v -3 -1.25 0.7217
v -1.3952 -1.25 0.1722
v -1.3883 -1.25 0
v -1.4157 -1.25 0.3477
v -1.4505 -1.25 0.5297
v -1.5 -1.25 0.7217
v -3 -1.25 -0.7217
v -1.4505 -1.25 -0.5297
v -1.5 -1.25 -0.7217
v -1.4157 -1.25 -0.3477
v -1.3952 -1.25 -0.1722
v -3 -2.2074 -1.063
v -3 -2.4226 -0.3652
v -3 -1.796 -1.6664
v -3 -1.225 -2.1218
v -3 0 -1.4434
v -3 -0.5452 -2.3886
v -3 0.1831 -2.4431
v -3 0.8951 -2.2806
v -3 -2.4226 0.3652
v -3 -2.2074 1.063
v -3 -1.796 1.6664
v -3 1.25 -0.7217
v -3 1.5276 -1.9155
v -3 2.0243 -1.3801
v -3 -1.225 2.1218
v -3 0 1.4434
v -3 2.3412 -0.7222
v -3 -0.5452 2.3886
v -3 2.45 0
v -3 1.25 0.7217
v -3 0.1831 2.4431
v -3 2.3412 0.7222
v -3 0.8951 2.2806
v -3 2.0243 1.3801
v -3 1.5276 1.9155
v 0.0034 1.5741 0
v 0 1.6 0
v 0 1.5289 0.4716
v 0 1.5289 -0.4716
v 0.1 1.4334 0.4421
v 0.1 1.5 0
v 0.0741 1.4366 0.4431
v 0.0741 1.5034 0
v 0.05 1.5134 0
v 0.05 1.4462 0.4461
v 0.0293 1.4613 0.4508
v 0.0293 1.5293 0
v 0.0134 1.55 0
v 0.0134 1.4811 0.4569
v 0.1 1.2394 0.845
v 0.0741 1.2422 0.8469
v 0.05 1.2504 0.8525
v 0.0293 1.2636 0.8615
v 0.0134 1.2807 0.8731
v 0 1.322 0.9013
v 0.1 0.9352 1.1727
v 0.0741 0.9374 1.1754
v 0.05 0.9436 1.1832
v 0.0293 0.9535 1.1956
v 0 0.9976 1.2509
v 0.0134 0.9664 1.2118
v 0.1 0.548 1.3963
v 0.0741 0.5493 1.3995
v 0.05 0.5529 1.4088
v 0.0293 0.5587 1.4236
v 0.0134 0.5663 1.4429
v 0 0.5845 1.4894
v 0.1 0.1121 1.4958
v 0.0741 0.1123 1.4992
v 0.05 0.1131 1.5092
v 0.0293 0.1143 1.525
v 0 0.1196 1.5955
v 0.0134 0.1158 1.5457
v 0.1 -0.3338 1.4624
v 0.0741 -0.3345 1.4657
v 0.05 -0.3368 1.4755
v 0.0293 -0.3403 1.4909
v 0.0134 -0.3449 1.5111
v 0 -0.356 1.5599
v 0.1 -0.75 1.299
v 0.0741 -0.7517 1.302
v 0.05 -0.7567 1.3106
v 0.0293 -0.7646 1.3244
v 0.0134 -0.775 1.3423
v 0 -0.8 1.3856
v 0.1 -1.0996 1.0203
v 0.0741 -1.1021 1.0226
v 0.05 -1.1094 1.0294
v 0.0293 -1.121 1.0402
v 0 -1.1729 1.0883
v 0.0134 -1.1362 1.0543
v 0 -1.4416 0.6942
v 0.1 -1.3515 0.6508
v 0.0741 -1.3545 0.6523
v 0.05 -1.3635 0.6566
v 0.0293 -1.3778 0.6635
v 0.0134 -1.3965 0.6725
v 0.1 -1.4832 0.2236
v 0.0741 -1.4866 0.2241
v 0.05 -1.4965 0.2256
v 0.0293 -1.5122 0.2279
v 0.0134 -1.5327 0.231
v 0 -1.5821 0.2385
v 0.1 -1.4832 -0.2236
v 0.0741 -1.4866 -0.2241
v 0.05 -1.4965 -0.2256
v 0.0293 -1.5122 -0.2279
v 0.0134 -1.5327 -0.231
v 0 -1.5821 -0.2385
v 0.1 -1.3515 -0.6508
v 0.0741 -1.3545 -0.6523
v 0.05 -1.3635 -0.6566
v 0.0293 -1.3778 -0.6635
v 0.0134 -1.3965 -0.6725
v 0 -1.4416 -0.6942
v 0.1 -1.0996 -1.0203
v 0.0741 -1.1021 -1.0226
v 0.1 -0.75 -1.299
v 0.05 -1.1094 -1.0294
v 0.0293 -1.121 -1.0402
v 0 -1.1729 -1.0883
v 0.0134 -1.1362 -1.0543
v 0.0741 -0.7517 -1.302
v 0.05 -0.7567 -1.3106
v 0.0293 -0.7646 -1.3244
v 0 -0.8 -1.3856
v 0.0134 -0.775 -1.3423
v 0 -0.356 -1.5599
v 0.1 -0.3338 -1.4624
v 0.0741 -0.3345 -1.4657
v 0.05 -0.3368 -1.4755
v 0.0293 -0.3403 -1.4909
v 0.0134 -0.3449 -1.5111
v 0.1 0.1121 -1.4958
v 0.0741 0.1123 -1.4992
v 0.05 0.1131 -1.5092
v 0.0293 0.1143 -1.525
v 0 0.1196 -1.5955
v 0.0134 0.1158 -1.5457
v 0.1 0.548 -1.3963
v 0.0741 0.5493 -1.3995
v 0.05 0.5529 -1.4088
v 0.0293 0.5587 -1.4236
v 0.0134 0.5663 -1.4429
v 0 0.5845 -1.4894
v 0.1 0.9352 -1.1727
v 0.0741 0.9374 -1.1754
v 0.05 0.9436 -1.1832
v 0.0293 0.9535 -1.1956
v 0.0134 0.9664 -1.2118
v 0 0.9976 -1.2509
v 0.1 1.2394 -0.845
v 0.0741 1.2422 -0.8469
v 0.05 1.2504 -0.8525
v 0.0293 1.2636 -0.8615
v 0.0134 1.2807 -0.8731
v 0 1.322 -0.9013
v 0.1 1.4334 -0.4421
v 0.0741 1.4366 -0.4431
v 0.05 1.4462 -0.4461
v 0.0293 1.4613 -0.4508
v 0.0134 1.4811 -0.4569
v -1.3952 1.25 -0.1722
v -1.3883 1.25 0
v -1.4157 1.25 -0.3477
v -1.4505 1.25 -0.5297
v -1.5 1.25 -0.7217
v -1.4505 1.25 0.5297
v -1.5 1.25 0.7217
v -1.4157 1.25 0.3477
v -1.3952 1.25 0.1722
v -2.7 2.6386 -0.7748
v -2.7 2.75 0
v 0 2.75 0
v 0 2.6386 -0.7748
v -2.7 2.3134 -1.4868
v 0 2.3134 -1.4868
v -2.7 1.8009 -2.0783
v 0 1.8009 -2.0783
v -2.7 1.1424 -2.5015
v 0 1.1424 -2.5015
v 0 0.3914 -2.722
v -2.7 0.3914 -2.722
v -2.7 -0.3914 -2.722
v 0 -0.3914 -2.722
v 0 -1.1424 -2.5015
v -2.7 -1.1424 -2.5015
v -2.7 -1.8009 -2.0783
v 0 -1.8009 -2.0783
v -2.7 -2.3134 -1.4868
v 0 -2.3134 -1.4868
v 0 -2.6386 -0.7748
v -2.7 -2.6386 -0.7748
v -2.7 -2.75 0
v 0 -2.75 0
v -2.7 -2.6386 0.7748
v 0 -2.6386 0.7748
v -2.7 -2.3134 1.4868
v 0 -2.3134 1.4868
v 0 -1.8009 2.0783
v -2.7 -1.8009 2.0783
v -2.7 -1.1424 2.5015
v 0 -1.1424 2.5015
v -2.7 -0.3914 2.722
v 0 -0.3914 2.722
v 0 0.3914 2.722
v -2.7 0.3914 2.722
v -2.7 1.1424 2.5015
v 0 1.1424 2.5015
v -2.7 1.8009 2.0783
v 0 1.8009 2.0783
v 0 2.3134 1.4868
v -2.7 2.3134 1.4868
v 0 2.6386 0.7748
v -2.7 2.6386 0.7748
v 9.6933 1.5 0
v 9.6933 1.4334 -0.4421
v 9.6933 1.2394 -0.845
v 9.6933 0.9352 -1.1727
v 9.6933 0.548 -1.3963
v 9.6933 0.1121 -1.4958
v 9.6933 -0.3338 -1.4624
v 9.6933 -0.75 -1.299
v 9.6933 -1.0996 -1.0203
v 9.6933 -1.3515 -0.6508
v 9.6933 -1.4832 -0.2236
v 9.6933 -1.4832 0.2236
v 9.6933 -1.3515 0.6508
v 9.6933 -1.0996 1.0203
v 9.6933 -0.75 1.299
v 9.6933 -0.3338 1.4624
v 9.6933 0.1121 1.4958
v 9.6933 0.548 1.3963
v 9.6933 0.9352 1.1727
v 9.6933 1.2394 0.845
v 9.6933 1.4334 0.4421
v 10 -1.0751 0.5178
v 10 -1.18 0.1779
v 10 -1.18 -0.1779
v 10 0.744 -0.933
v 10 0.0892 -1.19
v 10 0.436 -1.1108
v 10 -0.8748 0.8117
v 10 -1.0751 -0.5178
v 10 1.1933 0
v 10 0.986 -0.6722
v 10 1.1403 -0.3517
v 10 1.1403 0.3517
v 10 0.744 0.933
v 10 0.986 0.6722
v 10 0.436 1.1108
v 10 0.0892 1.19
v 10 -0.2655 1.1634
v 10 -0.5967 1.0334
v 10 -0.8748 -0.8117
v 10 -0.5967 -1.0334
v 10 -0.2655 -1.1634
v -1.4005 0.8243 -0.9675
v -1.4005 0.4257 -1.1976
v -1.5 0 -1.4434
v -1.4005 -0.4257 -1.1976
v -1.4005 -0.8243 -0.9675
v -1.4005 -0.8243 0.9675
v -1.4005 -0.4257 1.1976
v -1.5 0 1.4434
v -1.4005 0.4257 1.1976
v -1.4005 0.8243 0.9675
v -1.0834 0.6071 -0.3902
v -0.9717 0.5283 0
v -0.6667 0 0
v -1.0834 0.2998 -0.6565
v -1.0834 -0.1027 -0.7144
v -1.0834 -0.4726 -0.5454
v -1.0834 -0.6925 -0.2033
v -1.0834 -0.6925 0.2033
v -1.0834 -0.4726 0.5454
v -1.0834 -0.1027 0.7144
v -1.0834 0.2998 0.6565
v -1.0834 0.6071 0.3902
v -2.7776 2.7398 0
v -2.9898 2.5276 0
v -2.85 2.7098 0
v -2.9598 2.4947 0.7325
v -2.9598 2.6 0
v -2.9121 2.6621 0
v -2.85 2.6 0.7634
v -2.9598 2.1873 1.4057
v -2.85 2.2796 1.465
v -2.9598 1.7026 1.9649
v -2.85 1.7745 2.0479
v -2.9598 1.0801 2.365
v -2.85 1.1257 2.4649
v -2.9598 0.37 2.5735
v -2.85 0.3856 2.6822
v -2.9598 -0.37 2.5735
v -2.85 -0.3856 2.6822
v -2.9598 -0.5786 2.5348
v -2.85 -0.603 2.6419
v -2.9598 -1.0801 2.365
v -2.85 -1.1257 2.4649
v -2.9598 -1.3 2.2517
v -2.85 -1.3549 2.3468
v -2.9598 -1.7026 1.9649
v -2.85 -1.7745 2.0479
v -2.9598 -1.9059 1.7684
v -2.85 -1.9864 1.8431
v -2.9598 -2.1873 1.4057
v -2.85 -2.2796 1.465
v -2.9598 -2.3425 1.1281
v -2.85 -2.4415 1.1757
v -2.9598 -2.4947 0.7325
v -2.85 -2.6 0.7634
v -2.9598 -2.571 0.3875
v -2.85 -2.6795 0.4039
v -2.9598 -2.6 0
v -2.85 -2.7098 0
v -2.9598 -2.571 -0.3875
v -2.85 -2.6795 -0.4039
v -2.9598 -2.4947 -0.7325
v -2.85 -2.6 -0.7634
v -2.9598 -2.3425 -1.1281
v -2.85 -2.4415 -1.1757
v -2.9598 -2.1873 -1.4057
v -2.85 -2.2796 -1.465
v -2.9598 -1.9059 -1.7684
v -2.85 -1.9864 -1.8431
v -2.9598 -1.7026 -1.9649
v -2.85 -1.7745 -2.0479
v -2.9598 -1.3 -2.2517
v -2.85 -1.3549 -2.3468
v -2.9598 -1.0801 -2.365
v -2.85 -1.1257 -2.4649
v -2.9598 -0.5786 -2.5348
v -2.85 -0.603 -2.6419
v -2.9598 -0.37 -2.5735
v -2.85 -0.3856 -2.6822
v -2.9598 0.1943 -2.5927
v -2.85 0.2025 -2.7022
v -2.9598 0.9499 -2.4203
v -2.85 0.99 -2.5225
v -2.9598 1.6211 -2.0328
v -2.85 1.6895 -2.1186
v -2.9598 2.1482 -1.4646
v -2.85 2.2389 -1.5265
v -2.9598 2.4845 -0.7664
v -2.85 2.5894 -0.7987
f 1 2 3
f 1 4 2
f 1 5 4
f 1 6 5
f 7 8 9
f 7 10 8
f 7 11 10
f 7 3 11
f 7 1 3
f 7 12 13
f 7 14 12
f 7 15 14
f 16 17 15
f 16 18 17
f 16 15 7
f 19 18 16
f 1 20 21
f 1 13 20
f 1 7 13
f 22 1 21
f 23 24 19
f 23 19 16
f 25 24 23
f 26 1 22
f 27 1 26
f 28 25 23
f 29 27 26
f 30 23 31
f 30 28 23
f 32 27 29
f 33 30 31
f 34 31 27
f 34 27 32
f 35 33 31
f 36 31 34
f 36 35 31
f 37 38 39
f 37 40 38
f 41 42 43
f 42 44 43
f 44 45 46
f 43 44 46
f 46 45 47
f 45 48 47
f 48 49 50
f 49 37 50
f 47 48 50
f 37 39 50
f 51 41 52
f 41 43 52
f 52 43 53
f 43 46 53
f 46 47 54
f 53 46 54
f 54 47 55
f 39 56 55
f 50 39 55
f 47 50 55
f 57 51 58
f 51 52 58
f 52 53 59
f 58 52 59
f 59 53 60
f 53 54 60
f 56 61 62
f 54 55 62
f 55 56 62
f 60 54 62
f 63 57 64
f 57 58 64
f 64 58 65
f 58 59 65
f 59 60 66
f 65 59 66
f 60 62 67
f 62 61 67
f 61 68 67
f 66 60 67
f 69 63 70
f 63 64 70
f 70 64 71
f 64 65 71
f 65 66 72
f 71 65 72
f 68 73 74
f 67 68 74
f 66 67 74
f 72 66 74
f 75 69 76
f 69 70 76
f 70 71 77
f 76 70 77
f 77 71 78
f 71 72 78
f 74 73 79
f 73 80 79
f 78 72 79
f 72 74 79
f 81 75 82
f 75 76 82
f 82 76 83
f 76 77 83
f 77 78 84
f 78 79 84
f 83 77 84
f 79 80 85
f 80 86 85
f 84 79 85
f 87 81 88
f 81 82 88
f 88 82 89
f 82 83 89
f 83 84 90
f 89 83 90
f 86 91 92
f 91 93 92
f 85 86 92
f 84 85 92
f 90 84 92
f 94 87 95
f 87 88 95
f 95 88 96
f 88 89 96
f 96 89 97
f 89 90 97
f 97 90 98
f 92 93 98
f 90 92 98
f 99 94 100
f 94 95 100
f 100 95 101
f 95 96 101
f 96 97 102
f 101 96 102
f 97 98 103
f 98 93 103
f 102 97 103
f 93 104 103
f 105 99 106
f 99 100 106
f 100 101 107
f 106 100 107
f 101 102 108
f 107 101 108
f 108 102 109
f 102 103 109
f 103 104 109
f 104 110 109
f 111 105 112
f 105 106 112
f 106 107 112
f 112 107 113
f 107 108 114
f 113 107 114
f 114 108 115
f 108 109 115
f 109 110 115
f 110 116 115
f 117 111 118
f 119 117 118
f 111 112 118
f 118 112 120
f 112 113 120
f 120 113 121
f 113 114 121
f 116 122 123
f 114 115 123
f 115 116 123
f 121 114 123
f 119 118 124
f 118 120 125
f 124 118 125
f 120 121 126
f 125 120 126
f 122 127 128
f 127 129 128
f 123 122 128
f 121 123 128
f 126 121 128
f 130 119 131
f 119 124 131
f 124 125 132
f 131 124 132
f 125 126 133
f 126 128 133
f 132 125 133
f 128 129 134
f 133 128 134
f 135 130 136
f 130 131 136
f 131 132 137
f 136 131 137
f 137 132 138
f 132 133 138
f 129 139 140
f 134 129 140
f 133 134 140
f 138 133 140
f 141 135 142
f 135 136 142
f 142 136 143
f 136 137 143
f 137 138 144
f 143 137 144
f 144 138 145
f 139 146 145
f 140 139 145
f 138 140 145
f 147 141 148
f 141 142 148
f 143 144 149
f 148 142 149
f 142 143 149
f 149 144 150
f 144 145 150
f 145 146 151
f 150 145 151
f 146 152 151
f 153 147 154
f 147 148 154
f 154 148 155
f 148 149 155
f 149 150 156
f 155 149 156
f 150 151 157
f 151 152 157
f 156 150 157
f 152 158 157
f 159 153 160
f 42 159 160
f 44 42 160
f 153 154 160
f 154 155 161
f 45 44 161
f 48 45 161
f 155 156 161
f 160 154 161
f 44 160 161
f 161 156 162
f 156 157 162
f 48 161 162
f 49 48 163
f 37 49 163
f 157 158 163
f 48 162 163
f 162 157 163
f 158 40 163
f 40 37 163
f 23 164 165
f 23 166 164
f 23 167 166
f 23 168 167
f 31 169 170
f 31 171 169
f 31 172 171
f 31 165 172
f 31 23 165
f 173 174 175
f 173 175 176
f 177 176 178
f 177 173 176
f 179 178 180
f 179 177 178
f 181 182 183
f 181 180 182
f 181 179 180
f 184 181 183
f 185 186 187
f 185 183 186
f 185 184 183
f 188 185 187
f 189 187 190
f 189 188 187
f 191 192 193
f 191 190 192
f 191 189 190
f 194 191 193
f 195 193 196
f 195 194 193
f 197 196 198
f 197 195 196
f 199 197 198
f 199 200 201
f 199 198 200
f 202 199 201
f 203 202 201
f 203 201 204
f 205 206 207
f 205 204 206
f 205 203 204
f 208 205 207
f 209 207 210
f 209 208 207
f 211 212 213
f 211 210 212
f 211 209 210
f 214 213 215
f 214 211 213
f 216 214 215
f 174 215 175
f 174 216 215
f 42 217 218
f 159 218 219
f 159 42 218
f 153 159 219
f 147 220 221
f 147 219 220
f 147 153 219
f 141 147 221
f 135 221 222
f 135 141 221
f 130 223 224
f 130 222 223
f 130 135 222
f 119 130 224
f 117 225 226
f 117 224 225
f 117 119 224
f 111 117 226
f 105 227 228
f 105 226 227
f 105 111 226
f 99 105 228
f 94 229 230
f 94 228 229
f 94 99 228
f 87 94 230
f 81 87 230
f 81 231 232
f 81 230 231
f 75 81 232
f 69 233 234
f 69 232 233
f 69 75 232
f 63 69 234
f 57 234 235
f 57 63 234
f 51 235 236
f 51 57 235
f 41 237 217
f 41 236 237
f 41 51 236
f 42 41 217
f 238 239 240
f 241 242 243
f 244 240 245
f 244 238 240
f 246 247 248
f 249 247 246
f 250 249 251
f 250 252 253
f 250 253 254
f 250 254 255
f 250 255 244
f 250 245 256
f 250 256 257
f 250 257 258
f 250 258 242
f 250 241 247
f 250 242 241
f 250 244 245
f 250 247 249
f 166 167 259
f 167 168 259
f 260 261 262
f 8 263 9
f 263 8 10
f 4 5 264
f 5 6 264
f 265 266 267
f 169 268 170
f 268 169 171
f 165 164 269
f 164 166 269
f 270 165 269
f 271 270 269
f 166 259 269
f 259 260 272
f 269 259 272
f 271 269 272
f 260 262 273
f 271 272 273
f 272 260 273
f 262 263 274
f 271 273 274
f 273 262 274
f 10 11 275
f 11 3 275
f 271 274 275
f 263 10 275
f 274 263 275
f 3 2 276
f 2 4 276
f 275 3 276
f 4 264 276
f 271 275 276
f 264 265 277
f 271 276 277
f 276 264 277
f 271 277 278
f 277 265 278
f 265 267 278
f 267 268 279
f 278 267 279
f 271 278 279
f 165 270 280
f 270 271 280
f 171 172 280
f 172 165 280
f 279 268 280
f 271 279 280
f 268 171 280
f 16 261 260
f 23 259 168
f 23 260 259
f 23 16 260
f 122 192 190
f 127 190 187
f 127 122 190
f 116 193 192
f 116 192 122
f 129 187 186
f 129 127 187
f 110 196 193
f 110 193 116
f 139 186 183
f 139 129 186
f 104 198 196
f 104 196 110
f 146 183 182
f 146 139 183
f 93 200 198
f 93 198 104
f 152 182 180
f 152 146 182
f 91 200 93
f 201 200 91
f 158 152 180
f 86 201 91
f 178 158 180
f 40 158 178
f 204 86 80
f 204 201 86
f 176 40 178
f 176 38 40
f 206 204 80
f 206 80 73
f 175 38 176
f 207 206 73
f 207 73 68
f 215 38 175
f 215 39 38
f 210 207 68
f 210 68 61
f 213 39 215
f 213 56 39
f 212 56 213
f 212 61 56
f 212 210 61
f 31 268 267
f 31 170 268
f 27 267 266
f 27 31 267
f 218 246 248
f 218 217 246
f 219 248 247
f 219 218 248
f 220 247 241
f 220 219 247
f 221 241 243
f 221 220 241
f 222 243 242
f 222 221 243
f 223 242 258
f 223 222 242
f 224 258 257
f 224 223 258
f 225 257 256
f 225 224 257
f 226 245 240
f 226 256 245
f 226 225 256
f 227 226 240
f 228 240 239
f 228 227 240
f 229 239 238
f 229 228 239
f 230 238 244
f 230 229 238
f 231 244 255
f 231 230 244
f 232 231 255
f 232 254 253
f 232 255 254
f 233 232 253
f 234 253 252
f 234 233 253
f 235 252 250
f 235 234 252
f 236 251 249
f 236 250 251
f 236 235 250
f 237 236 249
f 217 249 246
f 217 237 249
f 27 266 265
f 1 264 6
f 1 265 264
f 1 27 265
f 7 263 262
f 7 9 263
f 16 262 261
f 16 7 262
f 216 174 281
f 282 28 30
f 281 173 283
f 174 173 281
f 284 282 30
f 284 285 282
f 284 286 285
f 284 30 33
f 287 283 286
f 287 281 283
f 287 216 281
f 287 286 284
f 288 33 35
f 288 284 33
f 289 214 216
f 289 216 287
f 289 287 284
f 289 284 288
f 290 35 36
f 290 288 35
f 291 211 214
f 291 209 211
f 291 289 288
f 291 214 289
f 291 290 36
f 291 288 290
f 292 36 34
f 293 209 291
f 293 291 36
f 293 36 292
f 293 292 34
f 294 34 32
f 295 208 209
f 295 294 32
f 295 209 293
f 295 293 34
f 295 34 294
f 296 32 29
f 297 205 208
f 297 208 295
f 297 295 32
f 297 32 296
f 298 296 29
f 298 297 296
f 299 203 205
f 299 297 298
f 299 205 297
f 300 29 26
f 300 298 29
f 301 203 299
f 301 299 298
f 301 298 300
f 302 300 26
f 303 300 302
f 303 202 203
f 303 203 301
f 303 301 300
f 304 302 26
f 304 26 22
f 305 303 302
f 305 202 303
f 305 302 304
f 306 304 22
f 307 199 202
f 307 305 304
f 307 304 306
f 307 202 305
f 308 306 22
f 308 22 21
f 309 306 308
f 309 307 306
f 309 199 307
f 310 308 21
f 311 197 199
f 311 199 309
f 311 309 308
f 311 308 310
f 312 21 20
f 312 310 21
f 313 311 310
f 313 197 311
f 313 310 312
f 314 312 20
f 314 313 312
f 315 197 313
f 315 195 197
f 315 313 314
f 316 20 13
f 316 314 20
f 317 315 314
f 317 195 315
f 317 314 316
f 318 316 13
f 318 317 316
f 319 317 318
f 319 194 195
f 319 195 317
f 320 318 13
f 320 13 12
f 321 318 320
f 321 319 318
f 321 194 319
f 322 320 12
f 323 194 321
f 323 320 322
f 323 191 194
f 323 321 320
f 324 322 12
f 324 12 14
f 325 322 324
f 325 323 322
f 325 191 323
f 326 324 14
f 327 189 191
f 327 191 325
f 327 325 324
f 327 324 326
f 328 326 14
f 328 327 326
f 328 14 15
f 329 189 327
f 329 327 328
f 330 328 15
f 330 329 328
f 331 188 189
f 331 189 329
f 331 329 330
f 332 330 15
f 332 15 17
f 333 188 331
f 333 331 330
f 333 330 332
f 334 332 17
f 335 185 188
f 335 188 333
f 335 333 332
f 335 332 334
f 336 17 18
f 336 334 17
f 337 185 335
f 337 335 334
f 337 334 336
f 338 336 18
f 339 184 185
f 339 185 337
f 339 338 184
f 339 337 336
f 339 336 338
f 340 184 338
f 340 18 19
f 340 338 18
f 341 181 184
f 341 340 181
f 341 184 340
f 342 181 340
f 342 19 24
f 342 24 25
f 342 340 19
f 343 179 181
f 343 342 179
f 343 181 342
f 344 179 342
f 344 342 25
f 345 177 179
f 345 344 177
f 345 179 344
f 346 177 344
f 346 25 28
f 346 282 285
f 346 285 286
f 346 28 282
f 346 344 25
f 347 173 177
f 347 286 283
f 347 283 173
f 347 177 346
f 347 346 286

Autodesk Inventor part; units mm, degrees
ref_plane "YZ Plane" through (0, 0, 0) normal (1, 0, 0) x (0, 1, 0)
ref_plane "XZ Plane" through (0, 0, 0) normal (0, 1, 0) x (-1, 0, 0)
sketch "Sketch1" plane through (0, 0, 0) normal (0, 0, 1) x (1, 0, 0)
  line L0 (-0.6667, 0) -> (10, 0)
  line L1 (10, 0) -> (10, 1.5)
  line L2 (10, 1.5) -> (1.3067, 1.5)
  line L3 (1.3067, 1.5) -> (0.9999, 1.5)
  line L4 (0.9999, 1.5) -> (0, 1.5)
  line L5 (0, 1.5) -> (0, 2.75)
  line L6 (0, 2.75) -> (-3, 2.75)
  line L7 (-3, 2.75) -> (-3, 1.4434)
  line L8 (-3, 1.4434) -> (-1.5, 1.4434)
  line L9 (-1.5, 1.4434) -> (-0.6667, 0)
  line L10 (-5.6, 0) -> (12.6, 0) projected
  line L11 (0, -0.55) -> (0, 3.3) projected
  line L12 (1.3067, 1.5) -> (0, 1.5) construction
  dimension "d1" = 8.6933
  dimension "d2" = 0.3068
  dimension "d3" = 3
  dimension "d4" = 1.5
  dimension "d5" = 60
  dimension "d6" = 3
  dimension "d7" = 3
  dimension "d8" = 2.8868
  dimension "d9" = 5.5
  dimension "d26" = 10
revolve "Body" add sketch "Sketch1" angle 360 about axis through (-0.6667, 0, 0) along (1, 0, 0)
sketch "Sketch2" plane through (-3, 0, 0) normal (-1, 0, 0) x (0, 0, 1)
  circle A0 centre (0, 0) radius 1.4434 projected
  line L0 (0, -3.85) -> (0, 3.85) projected
  line L1 (-3.85, 0) -> (3.85, 0) projected
  line L2 (1.4434, 0) -> (0.7217, -1.25)
  line L3 (0.7217, -1.25) -> (-0.7217, -1.25)
  line L4 (-0.7217, -1.25) -> (-1.4434, 0)
  line L5 (-1.4434, 0) -> (-0.7217, 1.25)
  line L6 (-0.7217, 1.25) -> (0.7217, 1.25)
  line L7 (0.7217, 1.25) -> (1.4434, 0)
  point P0 (0, 0)
extrude "Slot" add sketch "Sketch2" against normal up to next contours L7 A0 | A0 L2 | L6 L0 A0 | A0 L0 L3 | L0 L6 A0 | A0 L3 L0 | L4 A0 | A0 L5
fillet "Fillet1" radius 0.3 1 edges at (-3, -2.75, 0)
thread "Thread" size "M3x0.5" class "6g" standard "ISO Metric profile" length 8.6933
chamfer "Chamfer1" distance 0.3067 distance2 0.3067 1 edges at (10, -1.5, 0) measured on face at (10, -0.6587, -0.1791)
ref_plane "Work Plane1" through (29, 0, 0) normal (0, -1, 0) x (1, 0, 0)
fillet "Fillet2" radius 0.1 1 edges at (0, -1.5, 0)
equation "\"d1\" = GEL"
equation "\"d3\" = KOH"
equation "\"d4\" = INTI"
equation "\"d6\" = GD"
equation "\"d7\" = BDM"
equation "\"d8\" = 1.1547 * SW"
equation "\"d9\" = KOD"
equation "\"d26\" = NLG"
equation "\"d30\" = R"
equation "\"d17\" = RR"
equation "\"d13\" = GEL"
equation "\"d15\" = -0.5 * SPD + 0.5 * GD"
equation "\"d16\" = GUL"
equation "\"GD\" = NND"
equation "\"NLG\" = 10"
equation "\"GEL\" = 8.69327"
equation "\"KOD\" = 5.5"
equation "\"KOH\" = 3"
equation "\"INTI\" = 1.5"
equation "\"GAL\" = 0.61345 * PTC"
equation "\"GUL\" = 0.61345 * PTC"
equation "\"BDM\" = NND"
equation "\"SW\" = 2.5"
equation "\"RR\" = 0.3"
equation "\"SPD\" = 2.38655"
equation "\"R\" = 0.1"
equation "\"TOA\" = 30deg"
equation "\"THREADDIA\" = 3"
equation "\"PTC\" = 0.5"
equation "\"NND\" = 3"
equation "\"E0\" = 1.155 * SW"
equation "\"GD1\" = THREADDIA - 1.2269 * PTC"
properties part number "ANSI B18.3.1M - M3x0.5 x 10" material "Steel, Mild"
